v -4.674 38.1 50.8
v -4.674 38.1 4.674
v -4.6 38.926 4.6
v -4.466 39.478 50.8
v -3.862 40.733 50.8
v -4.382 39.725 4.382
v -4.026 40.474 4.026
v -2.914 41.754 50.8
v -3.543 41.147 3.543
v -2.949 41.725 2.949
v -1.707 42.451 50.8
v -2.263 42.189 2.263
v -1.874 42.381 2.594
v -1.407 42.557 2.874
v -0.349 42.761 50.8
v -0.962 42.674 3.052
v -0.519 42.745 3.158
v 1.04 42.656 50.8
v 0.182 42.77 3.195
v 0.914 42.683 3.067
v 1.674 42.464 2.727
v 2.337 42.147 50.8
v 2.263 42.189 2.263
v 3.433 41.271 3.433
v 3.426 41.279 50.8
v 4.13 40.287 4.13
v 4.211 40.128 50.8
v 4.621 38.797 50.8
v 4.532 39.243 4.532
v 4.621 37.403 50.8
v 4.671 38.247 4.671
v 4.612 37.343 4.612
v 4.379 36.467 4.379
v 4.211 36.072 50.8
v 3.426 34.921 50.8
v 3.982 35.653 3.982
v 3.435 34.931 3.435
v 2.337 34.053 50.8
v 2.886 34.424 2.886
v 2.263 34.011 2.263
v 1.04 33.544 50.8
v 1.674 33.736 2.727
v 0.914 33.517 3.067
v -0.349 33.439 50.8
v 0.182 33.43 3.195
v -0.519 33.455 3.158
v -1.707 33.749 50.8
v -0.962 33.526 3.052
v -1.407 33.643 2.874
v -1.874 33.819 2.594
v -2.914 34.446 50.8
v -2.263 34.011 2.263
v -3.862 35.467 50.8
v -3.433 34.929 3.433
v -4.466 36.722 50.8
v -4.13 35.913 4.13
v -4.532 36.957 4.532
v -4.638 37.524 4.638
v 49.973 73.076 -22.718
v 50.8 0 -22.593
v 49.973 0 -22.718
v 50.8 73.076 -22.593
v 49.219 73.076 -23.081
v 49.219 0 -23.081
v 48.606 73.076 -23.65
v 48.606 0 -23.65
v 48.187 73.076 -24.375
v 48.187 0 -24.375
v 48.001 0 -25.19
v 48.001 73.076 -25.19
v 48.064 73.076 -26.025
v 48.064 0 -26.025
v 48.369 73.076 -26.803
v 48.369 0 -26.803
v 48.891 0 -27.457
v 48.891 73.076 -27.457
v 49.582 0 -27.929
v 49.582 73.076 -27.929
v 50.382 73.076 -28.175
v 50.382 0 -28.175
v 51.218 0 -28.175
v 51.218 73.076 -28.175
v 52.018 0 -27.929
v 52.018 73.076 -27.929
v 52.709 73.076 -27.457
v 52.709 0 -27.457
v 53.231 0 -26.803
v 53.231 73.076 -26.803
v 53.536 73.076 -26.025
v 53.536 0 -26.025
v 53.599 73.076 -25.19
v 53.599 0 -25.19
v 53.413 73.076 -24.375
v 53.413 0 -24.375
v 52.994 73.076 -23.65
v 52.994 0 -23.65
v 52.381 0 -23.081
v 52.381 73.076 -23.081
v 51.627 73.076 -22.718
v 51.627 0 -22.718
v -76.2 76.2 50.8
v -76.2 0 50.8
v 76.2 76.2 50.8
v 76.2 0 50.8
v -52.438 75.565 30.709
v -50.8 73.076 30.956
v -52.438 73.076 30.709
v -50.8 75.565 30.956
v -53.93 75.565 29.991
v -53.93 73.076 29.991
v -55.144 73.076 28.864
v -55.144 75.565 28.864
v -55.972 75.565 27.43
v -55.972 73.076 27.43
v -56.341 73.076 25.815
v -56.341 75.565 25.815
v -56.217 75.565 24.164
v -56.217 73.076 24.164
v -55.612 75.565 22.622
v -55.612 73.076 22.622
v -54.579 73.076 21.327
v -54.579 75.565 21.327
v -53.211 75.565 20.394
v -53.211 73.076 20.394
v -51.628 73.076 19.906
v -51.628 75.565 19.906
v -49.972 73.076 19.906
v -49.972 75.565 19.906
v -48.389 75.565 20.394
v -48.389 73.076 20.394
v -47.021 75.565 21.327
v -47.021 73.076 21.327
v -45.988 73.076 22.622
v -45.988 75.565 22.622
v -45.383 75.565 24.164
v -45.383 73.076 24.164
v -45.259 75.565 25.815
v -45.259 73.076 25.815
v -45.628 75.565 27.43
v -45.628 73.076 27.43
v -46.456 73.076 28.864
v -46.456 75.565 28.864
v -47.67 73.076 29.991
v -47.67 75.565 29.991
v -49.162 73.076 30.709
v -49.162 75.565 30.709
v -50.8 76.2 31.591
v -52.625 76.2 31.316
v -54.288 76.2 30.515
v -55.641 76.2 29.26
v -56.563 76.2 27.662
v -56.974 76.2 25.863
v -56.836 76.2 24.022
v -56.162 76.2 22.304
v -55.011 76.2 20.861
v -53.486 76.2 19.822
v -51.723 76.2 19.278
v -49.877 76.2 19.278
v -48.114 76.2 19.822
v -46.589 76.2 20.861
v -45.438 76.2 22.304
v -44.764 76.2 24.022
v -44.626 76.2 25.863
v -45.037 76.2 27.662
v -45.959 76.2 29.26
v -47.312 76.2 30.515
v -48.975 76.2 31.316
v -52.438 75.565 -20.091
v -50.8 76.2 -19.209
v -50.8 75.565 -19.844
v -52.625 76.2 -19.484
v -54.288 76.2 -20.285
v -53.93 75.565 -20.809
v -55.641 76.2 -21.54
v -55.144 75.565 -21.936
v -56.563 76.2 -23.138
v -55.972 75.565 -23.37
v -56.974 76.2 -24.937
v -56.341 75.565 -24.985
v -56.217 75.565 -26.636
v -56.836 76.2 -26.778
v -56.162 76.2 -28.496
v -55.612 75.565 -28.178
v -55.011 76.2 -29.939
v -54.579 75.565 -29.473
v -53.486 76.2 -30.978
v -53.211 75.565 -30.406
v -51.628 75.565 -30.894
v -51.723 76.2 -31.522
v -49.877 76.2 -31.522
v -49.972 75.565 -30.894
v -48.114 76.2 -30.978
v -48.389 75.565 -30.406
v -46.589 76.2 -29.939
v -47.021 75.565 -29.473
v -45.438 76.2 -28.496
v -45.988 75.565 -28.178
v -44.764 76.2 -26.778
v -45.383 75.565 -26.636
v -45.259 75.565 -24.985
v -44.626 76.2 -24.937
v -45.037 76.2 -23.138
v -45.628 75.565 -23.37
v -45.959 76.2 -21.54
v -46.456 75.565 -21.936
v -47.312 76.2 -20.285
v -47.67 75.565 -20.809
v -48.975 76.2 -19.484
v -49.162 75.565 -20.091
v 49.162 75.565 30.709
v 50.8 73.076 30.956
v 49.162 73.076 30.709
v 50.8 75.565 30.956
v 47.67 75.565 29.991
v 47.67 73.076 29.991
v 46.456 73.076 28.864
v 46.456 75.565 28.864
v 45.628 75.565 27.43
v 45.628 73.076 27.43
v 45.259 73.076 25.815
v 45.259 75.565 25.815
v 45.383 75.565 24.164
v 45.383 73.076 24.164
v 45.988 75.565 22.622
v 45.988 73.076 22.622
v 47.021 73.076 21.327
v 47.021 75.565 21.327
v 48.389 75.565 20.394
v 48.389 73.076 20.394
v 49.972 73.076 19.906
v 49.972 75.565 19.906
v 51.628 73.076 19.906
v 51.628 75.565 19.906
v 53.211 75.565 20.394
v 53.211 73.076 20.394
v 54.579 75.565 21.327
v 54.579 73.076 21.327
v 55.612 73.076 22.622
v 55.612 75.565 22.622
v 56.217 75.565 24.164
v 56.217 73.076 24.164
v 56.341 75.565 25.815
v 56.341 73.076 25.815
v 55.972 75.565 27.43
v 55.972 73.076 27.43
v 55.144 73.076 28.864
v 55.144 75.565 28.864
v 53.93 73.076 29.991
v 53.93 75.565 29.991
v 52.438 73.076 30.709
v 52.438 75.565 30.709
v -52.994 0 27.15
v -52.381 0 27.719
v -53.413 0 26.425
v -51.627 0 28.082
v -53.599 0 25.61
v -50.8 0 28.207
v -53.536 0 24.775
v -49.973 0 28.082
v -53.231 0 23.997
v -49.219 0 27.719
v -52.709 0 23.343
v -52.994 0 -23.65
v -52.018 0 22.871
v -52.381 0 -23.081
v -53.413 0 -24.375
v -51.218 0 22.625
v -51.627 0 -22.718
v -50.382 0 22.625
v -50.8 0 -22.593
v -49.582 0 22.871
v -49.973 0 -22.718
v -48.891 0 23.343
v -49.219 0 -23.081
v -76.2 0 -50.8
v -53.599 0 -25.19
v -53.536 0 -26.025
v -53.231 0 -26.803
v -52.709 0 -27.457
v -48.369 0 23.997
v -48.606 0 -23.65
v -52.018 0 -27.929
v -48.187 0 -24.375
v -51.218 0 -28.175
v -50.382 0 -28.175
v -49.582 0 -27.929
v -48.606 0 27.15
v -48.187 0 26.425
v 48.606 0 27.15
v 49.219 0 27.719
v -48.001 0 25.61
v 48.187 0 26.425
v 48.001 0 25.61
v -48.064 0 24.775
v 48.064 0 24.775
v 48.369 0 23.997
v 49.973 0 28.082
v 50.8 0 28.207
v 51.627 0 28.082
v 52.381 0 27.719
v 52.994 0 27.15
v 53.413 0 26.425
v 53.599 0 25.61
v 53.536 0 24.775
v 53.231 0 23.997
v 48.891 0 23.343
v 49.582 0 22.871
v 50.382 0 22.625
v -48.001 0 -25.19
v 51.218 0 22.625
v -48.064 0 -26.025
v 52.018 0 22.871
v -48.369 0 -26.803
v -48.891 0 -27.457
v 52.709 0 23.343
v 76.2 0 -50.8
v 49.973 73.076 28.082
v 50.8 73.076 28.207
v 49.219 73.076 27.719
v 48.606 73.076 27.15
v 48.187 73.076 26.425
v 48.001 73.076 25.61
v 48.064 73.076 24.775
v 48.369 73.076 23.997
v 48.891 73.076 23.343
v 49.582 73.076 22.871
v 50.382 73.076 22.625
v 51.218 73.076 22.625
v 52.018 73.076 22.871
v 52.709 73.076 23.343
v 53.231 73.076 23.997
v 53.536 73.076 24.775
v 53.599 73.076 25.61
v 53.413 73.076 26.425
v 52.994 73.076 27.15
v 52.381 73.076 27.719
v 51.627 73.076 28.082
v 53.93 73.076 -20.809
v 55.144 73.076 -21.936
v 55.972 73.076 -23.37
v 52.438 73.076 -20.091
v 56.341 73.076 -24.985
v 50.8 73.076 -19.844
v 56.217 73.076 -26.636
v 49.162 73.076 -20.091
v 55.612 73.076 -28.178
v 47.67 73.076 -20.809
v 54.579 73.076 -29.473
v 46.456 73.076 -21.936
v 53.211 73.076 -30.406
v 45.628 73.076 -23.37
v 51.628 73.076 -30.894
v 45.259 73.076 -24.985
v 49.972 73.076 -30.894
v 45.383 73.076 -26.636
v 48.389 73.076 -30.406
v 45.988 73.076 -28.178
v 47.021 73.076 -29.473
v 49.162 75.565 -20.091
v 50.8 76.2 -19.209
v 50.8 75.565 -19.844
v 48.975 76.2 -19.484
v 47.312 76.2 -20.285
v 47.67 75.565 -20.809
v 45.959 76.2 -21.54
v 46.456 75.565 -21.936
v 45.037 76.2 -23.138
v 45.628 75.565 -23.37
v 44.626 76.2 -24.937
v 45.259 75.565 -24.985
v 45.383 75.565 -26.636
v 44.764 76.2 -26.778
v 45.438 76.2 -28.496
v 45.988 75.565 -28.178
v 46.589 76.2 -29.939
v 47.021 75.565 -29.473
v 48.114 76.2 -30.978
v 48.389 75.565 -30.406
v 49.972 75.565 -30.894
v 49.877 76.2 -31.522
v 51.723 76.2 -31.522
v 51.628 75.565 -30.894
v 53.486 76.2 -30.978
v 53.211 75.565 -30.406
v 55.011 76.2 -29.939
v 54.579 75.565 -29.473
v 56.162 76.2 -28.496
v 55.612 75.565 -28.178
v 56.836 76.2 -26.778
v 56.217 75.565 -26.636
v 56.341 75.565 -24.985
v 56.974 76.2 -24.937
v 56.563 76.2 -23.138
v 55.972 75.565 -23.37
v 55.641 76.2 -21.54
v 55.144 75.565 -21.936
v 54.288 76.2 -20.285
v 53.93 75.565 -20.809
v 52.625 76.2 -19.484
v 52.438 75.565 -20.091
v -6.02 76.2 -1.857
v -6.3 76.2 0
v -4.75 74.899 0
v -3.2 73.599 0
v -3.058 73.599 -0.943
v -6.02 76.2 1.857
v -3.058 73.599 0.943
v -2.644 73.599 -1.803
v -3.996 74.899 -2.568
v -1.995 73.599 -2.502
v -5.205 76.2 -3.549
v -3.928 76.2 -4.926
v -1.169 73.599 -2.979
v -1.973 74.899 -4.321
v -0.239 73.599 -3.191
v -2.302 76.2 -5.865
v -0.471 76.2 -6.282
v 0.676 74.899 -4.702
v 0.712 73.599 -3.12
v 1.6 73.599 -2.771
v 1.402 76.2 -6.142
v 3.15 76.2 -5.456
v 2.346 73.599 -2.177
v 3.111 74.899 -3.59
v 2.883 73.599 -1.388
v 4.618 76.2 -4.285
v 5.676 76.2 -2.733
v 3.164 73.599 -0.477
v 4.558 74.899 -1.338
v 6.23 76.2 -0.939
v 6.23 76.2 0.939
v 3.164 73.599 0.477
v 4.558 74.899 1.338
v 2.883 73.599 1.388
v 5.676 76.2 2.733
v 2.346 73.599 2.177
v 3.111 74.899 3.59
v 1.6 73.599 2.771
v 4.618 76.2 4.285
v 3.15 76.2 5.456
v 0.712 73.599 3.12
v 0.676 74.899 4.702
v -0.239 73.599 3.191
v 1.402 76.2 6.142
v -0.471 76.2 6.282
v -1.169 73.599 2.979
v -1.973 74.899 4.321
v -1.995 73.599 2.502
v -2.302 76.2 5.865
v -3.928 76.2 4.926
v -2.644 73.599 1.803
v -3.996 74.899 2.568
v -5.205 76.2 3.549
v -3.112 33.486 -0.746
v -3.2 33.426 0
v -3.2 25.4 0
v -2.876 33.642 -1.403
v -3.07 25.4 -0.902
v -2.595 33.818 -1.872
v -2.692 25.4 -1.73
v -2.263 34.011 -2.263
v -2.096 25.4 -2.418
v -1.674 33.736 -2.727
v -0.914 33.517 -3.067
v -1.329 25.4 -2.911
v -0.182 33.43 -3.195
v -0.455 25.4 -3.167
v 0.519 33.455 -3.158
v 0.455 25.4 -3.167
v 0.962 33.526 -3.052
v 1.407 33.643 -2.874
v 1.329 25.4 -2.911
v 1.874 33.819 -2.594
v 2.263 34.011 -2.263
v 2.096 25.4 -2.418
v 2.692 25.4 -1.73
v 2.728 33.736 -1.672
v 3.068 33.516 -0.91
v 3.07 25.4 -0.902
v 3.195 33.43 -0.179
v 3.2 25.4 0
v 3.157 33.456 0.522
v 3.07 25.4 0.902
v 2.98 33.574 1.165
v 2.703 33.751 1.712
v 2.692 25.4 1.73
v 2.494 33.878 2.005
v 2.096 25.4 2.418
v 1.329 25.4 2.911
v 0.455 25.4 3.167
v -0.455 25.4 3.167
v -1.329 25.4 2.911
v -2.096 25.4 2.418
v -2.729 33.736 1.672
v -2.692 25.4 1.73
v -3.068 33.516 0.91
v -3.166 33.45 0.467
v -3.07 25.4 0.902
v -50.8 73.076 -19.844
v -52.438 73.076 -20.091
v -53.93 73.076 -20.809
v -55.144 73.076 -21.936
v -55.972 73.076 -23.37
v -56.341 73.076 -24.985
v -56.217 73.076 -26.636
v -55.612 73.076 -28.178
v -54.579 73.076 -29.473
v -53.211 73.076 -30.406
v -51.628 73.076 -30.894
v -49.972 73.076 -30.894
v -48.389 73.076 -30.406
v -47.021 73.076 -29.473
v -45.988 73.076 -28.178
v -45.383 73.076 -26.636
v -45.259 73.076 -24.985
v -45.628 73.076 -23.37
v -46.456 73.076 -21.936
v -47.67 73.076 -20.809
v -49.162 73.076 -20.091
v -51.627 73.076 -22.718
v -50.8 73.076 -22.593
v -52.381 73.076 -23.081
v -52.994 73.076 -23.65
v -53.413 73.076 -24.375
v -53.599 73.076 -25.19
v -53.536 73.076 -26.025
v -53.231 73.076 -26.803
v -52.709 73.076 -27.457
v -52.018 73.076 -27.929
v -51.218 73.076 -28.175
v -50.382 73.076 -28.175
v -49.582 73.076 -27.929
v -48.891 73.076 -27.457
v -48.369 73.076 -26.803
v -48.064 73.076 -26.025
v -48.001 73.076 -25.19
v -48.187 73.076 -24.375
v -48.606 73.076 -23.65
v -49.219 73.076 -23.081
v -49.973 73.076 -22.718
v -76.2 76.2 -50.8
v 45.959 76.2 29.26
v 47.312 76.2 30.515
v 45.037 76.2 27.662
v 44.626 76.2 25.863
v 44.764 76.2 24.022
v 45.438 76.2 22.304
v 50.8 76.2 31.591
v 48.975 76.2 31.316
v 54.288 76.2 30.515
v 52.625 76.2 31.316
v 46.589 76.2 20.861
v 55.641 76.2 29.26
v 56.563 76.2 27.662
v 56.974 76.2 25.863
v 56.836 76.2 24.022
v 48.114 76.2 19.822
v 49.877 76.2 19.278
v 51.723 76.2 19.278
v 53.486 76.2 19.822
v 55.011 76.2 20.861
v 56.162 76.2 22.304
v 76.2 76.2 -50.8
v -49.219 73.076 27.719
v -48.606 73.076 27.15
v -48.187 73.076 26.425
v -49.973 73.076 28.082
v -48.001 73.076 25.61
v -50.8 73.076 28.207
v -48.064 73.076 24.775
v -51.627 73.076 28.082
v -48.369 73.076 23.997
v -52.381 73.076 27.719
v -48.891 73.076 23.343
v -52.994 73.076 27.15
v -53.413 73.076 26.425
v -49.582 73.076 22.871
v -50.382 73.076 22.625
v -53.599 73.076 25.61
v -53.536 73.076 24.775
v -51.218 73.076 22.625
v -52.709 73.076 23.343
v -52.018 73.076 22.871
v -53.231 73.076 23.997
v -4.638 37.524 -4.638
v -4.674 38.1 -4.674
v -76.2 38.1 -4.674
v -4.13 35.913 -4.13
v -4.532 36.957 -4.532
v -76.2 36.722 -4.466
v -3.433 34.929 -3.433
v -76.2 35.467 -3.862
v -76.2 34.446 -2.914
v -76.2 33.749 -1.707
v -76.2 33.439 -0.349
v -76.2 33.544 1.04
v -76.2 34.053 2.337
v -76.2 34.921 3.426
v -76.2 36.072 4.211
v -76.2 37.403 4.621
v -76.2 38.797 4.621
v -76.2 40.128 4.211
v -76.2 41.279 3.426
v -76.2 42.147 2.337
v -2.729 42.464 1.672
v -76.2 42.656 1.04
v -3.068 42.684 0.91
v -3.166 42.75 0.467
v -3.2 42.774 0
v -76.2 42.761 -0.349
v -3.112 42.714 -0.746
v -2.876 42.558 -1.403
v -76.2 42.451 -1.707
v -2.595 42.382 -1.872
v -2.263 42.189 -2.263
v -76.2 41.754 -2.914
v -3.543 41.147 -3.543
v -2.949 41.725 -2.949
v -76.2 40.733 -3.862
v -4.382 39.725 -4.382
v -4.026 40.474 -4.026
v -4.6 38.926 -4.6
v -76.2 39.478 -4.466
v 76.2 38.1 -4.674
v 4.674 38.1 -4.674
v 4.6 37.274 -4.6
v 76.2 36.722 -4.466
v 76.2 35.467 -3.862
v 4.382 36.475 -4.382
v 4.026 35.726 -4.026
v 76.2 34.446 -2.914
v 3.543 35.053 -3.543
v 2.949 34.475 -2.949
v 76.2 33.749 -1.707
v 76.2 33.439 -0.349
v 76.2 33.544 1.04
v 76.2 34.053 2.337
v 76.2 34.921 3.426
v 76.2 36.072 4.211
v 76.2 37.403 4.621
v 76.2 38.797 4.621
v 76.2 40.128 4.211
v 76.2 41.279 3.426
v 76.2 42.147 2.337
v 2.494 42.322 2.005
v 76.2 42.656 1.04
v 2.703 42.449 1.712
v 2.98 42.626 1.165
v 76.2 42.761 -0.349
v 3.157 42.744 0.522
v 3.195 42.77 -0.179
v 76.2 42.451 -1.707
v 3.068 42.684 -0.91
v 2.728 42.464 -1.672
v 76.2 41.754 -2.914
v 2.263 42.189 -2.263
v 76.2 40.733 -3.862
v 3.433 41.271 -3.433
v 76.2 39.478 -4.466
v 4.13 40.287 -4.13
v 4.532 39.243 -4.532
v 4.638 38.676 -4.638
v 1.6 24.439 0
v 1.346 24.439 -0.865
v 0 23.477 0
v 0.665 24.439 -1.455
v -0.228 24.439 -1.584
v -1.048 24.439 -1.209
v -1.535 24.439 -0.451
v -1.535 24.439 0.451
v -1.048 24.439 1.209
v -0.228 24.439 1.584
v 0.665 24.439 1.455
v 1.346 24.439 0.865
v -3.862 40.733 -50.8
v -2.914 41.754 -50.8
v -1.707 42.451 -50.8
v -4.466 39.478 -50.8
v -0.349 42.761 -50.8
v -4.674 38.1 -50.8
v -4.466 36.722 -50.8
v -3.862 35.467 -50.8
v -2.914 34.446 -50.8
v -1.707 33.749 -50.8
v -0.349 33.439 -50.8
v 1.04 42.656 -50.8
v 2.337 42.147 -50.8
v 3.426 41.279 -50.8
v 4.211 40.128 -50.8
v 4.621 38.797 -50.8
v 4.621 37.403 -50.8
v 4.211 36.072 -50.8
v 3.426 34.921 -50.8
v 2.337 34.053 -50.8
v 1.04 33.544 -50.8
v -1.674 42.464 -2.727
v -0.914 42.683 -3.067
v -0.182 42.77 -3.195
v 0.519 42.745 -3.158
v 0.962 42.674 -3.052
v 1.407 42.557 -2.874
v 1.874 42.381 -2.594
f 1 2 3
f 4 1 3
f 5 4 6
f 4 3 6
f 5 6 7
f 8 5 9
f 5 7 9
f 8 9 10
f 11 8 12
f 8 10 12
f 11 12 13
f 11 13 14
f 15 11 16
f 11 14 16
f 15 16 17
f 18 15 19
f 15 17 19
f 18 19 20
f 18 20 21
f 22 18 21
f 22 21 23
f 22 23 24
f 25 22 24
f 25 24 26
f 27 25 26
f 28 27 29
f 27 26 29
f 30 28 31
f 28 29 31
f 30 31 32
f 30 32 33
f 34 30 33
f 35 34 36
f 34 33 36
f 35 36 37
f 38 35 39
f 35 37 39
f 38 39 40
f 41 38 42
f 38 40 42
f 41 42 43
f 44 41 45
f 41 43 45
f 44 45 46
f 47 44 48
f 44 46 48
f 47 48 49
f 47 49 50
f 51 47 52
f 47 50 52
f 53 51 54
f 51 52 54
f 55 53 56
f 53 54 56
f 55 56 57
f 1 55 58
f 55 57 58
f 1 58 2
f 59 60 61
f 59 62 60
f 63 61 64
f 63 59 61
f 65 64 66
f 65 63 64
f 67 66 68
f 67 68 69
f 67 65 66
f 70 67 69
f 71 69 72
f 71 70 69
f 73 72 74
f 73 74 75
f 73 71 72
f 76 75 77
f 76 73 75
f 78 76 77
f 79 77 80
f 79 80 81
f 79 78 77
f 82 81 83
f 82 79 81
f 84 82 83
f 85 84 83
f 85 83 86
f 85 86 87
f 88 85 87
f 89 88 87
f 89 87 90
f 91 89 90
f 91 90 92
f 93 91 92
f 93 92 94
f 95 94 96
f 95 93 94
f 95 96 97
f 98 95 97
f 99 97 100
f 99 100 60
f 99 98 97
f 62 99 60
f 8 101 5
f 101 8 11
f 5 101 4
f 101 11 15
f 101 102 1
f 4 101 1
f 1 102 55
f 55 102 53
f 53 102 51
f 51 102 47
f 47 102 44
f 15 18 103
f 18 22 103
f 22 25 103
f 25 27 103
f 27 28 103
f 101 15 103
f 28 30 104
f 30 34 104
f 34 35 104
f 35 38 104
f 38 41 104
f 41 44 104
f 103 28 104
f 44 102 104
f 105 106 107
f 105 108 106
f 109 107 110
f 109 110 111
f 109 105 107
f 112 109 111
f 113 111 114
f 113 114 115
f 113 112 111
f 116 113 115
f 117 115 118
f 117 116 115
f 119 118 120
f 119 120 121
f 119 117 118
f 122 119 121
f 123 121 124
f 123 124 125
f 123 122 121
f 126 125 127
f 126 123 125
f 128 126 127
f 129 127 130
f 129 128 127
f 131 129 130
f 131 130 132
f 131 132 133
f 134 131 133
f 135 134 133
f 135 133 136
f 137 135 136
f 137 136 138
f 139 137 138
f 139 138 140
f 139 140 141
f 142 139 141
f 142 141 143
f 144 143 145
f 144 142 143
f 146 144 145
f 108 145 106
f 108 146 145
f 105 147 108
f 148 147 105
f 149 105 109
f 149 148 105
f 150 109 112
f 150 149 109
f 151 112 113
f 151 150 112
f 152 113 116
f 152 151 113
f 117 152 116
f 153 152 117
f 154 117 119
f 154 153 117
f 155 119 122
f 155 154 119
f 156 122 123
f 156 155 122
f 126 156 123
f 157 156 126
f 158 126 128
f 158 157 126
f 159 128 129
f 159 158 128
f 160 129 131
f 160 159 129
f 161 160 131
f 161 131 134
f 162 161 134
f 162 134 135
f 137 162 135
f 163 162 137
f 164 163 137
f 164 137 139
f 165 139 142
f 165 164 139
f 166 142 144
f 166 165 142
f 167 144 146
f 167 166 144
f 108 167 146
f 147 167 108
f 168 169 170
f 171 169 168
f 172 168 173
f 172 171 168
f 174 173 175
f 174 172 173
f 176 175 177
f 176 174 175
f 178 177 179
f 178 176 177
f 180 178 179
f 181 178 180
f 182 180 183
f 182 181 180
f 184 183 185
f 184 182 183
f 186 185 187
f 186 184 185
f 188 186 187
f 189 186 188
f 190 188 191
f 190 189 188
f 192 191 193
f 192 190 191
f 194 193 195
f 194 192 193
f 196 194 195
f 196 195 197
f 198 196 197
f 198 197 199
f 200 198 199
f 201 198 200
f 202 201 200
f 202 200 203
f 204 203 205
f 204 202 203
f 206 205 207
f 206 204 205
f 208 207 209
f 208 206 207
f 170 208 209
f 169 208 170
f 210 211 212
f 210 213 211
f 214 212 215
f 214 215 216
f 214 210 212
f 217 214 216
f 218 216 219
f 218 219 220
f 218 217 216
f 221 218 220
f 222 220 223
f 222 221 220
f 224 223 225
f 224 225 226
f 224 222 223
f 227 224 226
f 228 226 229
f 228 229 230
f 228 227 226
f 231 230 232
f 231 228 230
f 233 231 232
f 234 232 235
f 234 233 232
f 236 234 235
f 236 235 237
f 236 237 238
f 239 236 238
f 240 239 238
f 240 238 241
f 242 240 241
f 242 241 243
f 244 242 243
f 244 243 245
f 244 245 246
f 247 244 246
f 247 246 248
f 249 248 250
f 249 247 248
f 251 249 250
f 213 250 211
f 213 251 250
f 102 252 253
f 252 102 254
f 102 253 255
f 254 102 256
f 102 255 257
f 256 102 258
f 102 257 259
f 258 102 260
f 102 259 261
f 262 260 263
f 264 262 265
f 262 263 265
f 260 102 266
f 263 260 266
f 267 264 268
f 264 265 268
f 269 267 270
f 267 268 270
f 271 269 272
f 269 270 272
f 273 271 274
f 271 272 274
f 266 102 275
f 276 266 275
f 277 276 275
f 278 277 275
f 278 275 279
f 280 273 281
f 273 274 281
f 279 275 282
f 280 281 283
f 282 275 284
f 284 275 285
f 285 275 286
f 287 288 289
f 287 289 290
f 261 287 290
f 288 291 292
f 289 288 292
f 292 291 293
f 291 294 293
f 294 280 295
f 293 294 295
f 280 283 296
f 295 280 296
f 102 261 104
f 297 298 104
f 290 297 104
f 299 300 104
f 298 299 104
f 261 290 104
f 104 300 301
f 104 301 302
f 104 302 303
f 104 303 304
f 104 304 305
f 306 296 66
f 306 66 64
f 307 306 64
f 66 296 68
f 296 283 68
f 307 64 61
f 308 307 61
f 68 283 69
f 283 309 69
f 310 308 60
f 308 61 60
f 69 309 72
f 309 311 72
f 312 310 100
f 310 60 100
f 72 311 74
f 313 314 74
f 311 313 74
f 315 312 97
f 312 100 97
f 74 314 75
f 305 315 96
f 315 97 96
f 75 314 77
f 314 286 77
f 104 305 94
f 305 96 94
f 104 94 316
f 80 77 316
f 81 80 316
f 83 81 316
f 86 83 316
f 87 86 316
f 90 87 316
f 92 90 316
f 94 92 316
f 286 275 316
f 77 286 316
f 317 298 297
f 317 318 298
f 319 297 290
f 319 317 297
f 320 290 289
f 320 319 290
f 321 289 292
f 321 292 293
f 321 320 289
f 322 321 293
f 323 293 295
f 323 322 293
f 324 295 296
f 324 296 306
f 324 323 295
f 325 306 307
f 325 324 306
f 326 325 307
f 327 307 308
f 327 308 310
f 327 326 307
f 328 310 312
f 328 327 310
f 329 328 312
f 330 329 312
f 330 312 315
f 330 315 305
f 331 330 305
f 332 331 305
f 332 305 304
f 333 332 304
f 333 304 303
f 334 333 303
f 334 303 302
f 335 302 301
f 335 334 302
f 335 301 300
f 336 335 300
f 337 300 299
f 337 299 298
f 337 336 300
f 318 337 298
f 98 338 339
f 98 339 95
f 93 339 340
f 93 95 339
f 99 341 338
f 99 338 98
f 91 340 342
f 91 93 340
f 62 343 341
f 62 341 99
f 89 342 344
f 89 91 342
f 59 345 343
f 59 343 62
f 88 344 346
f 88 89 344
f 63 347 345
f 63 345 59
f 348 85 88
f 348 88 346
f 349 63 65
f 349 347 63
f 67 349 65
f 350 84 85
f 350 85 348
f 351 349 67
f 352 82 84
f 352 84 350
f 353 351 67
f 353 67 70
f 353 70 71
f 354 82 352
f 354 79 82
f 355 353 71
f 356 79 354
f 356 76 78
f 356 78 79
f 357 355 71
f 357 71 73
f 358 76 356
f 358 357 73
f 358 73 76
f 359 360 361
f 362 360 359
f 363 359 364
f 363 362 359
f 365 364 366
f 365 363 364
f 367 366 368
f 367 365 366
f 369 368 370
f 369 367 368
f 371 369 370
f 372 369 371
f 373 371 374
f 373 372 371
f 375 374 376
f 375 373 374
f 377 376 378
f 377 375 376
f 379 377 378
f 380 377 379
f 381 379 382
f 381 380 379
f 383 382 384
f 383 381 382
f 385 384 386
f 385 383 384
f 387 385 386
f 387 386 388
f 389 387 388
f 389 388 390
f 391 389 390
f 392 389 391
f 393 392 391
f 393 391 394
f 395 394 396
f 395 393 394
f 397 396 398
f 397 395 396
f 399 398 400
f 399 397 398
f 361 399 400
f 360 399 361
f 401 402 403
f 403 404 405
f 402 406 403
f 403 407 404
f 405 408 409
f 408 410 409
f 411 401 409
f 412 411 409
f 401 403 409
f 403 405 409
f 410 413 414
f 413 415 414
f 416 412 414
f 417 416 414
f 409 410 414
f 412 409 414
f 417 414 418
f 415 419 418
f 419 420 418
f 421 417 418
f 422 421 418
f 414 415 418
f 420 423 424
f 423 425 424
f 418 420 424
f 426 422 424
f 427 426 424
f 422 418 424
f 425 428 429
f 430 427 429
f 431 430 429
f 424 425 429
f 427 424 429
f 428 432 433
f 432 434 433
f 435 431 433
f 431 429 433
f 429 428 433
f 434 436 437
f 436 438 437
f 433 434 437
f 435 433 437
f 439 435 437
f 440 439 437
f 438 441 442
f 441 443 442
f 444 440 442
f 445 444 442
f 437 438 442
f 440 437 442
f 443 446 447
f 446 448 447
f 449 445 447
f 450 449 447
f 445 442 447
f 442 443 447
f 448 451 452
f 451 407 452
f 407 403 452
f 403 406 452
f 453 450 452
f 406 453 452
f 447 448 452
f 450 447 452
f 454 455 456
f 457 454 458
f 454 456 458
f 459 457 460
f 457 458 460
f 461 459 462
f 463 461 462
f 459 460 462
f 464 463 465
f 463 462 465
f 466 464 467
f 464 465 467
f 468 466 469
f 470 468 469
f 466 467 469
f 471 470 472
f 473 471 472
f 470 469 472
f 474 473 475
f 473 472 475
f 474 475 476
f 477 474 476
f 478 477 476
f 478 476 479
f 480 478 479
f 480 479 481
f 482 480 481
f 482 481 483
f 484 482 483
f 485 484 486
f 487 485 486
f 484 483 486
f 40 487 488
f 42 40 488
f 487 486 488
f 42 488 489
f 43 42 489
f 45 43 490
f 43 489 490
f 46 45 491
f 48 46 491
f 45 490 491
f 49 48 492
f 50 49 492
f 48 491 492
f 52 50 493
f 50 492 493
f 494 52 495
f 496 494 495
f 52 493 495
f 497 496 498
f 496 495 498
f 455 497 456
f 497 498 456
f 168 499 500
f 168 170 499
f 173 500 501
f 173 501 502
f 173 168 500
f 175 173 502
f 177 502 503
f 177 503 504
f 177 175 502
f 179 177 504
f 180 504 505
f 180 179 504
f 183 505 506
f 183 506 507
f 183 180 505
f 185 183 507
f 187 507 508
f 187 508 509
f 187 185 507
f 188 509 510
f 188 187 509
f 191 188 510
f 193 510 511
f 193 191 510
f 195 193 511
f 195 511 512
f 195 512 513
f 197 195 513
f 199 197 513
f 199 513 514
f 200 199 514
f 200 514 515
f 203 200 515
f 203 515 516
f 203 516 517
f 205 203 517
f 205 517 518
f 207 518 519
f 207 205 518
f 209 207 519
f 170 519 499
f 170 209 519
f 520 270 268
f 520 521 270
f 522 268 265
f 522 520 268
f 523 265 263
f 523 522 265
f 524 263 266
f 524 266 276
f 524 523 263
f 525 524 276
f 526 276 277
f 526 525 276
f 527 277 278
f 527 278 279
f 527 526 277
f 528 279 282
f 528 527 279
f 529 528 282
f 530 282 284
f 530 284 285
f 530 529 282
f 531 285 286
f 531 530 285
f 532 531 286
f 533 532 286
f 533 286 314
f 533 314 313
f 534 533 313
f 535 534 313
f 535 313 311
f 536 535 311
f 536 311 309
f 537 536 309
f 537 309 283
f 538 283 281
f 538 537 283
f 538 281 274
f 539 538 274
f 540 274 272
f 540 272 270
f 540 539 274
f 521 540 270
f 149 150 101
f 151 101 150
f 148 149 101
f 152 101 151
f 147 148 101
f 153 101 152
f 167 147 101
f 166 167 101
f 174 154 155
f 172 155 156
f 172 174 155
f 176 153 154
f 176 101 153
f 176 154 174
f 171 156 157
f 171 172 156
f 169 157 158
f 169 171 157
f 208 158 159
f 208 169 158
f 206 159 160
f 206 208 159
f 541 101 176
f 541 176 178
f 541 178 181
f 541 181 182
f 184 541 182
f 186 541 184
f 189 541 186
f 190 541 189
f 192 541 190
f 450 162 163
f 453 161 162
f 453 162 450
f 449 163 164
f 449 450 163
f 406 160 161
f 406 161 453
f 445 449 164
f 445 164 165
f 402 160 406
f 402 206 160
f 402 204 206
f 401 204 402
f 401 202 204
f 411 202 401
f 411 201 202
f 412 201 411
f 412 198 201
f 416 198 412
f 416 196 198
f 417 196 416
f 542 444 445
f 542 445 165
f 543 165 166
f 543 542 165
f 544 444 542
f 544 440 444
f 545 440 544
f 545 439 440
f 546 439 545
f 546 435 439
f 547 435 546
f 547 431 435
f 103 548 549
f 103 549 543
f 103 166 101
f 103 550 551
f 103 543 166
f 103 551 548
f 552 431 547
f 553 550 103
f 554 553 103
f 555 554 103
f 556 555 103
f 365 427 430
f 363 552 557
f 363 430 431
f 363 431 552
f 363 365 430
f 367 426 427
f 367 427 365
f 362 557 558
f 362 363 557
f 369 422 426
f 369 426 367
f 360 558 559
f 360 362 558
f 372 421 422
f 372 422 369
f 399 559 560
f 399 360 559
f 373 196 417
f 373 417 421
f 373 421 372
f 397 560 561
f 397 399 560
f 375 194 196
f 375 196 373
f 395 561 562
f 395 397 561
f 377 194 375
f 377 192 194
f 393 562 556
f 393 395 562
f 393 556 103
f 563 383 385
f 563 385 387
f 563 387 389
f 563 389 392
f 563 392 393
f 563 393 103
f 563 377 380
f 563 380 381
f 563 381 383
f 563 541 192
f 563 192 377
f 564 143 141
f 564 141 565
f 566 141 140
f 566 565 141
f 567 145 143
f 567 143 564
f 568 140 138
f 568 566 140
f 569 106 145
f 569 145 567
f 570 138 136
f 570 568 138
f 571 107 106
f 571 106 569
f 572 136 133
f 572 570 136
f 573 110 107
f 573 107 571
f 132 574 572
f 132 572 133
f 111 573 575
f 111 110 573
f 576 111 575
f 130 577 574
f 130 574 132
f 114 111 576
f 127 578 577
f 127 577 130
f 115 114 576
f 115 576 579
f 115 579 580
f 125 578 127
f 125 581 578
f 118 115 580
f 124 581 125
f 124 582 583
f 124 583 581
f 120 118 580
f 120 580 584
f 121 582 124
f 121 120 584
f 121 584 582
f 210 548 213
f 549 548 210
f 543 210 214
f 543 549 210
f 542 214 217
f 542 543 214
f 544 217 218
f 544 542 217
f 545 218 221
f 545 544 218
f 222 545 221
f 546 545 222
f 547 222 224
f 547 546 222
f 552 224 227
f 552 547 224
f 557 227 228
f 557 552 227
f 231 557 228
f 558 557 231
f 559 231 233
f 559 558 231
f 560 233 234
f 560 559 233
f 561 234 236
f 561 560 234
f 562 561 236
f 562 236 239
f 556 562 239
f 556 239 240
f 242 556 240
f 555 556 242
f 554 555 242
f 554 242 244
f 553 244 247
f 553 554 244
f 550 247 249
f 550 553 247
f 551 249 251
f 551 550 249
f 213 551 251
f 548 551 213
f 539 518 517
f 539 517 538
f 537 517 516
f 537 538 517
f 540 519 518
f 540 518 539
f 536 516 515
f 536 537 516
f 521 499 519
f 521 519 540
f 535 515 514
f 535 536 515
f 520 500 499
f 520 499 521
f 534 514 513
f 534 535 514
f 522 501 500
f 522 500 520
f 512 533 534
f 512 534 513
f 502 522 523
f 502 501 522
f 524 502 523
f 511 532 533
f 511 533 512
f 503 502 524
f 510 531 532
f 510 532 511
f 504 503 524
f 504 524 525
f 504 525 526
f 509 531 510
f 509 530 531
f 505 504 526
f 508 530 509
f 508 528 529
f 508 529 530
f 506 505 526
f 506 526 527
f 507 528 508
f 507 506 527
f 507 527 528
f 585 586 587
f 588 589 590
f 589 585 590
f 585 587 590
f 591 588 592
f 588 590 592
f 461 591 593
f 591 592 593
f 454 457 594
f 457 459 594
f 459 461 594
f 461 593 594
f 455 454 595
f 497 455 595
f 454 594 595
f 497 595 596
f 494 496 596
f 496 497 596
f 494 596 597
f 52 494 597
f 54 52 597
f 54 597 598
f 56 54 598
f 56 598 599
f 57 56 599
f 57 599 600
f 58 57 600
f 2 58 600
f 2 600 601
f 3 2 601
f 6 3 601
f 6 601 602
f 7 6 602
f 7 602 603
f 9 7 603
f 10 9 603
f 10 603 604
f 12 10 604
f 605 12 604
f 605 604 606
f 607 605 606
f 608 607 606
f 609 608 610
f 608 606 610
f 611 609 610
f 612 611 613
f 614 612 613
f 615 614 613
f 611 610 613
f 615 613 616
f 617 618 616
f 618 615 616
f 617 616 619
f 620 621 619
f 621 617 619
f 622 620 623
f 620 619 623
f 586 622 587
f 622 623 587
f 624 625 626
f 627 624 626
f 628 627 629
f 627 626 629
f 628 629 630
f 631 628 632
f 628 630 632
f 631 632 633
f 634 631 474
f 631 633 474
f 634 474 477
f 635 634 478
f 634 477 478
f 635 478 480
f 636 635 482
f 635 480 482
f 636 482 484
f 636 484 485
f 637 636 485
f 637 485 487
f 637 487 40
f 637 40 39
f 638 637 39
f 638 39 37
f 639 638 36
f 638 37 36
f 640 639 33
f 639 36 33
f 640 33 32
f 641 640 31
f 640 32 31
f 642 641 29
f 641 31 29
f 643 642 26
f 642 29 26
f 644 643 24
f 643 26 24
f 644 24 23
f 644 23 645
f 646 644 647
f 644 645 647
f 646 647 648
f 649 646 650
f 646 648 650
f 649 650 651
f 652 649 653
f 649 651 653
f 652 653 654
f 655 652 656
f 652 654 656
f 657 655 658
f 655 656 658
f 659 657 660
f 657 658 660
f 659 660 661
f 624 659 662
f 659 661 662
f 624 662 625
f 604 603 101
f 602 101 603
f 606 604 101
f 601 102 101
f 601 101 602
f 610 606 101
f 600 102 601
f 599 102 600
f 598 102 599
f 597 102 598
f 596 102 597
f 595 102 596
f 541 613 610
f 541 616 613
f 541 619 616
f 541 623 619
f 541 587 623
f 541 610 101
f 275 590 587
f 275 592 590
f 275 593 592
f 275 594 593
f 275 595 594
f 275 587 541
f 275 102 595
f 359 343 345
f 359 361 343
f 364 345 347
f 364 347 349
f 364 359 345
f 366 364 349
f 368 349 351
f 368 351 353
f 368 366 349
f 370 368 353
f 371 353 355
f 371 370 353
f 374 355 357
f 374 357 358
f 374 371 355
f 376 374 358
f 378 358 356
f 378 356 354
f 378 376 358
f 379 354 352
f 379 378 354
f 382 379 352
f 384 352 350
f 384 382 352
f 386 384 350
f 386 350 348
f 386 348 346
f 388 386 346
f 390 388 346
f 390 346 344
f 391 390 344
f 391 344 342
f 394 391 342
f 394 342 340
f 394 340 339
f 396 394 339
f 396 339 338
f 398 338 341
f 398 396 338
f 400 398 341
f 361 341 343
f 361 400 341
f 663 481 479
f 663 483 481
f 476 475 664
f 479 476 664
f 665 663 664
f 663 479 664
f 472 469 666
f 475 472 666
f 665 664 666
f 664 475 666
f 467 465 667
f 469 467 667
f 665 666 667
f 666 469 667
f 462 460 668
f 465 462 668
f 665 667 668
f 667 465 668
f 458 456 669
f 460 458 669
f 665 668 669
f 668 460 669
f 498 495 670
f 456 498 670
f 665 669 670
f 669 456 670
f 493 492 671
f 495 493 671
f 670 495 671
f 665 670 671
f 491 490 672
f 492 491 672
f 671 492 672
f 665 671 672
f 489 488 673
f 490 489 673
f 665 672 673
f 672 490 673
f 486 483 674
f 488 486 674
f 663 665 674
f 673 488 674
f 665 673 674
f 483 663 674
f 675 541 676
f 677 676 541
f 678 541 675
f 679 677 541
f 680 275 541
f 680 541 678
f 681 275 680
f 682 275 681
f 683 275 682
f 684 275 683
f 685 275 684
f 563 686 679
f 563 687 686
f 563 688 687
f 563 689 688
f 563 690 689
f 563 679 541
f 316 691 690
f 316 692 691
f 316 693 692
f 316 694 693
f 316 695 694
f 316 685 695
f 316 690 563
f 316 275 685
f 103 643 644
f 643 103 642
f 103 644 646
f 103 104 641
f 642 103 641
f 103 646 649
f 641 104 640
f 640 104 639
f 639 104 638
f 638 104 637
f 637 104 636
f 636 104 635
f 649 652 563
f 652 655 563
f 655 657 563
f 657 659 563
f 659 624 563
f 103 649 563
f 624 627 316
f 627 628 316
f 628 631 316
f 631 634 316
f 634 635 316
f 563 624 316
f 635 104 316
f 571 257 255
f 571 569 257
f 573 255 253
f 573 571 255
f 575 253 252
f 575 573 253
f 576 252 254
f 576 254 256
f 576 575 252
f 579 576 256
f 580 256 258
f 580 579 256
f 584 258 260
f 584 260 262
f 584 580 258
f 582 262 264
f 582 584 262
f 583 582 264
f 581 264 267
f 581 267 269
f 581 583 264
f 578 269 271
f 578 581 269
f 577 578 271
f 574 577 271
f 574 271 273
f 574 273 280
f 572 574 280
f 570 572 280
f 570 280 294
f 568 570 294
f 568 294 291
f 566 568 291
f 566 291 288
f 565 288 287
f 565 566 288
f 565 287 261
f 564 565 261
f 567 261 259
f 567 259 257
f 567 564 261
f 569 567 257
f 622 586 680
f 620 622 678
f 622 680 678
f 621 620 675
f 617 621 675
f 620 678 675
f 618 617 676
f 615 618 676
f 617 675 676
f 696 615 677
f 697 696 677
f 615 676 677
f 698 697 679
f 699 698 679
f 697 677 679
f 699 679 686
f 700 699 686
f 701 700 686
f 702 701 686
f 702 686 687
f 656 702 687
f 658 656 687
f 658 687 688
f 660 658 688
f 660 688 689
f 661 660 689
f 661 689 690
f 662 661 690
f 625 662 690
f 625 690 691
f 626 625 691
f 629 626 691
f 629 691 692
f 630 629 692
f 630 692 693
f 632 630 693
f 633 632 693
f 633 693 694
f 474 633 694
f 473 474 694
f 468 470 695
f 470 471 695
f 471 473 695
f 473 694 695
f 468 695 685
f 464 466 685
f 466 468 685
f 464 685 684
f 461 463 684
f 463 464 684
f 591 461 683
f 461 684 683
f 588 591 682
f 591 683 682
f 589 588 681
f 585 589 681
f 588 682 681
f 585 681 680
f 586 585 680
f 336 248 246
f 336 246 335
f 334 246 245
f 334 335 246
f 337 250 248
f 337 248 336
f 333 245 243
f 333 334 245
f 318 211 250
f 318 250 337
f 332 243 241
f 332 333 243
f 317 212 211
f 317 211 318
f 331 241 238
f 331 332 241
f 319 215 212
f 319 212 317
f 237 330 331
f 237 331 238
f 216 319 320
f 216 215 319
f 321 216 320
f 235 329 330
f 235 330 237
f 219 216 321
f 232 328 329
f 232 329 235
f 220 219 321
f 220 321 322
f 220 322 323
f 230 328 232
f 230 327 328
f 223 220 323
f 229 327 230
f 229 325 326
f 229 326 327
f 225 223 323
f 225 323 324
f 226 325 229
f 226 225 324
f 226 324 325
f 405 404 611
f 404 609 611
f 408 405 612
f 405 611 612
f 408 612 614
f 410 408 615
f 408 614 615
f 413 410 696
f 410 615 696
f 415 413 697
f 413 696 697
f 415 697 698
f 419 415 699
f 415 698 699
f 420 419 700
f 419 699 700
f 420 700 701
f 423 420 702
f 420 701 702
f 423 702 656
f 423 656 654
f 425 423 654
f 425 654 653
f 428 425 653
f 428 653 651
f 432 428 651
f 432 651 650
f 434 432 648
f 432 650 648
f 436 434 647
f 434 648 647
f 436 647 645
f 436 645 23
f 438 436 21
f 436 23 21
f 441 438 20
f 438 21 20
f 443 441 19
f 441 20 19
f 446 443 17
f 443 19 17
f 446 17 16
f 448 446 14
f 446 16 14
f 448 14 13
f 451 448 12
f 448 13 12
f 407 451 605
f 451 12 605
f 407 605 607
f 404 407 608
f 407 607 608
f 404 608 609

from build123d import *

# Parameters (mm, degrees)
SKETCH1_W                                       = 152.4
SKETCH1_H                                       = 101.6
BOSS_EXTRUDE1_DEPTH                             = 76.2
CBORE_FOR_10_BINDING_HEAD_MACHINE_S_2_COUNT     = 2
CBORE_FOR_10_BINDING_HEAD_MACHINE_S_2_PITCH     = 101.6
CBORE_FOR_10_BINDING_HEAD_MACHINE_S_3_COUNT     = 2
CBORE_FOR_10_BINDING_HEAD_MACHINE_S_3_PITCH     = 113.592253257
CBORE_FOR_10_BINDING_HEAD_MACHINE_S_4_COUNT     = 2
CBORE_FOR_10_BINDING_HEAD_MACHINE_S_4_PITCH     = 50.8
CSK_FOR_M6_FLAT_HEAD_MACHINE_SCREW1_D           = 6.4
CSK_FOR_M6_FLAT_HEAD_MACHINE_SCREW1_DEPTH       = 50.8
CSK_FOR_M6_FLAT_HEAD_MACHINE_SCREW1_CSINK_D     = 12.6
CSK_FOR_M6_FLAT_HEAD_MACHINE_SCREW1_CSINK_ANGLE = 100
CSK_FOR_M6_FLAT_HEAD_MACHINE_SCREW1_TIP         = 1.922753981
F_7_16_14_TAPPED_HOLE1_D                        = 9.3472
F_7_16_14_TAPPED_HOLE1_ON_FACE_2_D              = 9.3472


with BuildPart() as part:
    # Sketch1 → Boss-Extrude1 (new body)
    with BuildSketch(Plane(origin=(0, 0, 0), x_dir=(1, 0, 0), z_dir=(0, 1, 0))):
        Rectangle(SKETCH1_W, SKETCH1_H)
    extrude(amount=BOSS_EXTRUDE1_DEPTH)

    # Sketch7 → CBORE for #10 Binding Head Machine Screw2 (revolve, cut)
    with BuildSketch(Plane(origin=(-50.8, 76.2, -25.4), x_dir=(0, 0, 1), z_dir=(1, 0, 0))):
        Polygon((0, 0), (0, 76.2), (2.8067, 76.2), (2.8067, 3.1242), (5.55625, 3.1242), (5.55625, 0.635), (6.19125, 0), align=None)
    cbore_for_10_binding_head_machine_screw = revolve(axis=Axis((-50.8, 82.55, -25.4), (0, -1, 0)), mode=Mode.SUBTRACT)

    # CBORE for _10 Binding Head Machine S 2: CBORE for #10 Binding Head Machine Screw2 ×2
    with Locations(*[(i * CBORE_FOR_10_BINDING_HEAD_MACHINE_S_2_PITCH, 0, 0) for i in range(1, CBORE_FOR_10_BINDING_HEAD_MACHINE_S_2_COUNT)]):
        add(cbore_for_10_binding_head_machine_screw, mode=Mode.SUBTRACT)

    # CBORE for _10 Binding Head Machine S 3: CBORE for #10 Binding Head Machine Screw2 ×2
    with Locations(*[Vector(0.894427191, 0, 0.447213595) * (i * CBORE_FOR_10_BINDING_HEAD_MACHINE_S_3_PITCH) for i in range(1, CBORE_FOR_10_BINDING_HEAD_MACHINE_S_3_COUNT)]):
        add(cbore_for_10_binding_head_machine_screw, mode=Mode.SUBTRACT)

    # CBORE for _10 Binding Head Machine S 4: CBORE for #10 Binding Head Machine Screw2 ×2
    with Locations(*[(0, 0, i * CBORE_FOR_10_BINDING_HEAD_MACHINE_S_4_PITCH) for i in range(1, CBORE_FOR_10_BINDING_HEAD_MACHINE_S_4_COUNT)]):
        add(cbore_for_10_binding_head_machine_screw, mode=Mode.SUBTRACT)

    # CSK for M6 Flat Head Machine Screw1
    with Locations(Plane(origin=(0, 76.2, 0), x_dir=(1, 0, 0), z_dir=(0, 1, 0))):
        with Locations((0, 0)):
            CounterSinkHole(CSK_FOR_M6_FLAT_HEAD_MACHINE_SCREW1_D / 2, CSK_FOR_M6_FLAT_HEAD_MACHINE_SCREW1_CSINK_D / 2, depth=CSK_FOR_M6_FLAT_HEAD_MACHINE_SCREW1_DEPTH, counter_sink_angle=CSK_FOR_M6_FLAT_HEAD_MACHINE_SCREW1_CSINK_ANGLE)
            with Locations((0, 0, -(CSK_FOR_M6_FLAT_HEAD_MACHINE_SCREW1_DEPTH + CSK_FOR_M6_FLAT_HEAD_MACHINE_SCREW1_TIP / 2))):  # 118° drill point
                Cone(0, CSK_FOR_M6_FLAT_HEAD_MACHINE_SCREW1_D / 2, CSK_FOR_M6_FLAT_HEAD_MACHINE_SCREW1_TIP, mode=Mode.SUBTRACT)

    # 7/16-14 Tapped Hole1 (through all)
    with Locations(Plane(origin=(0, 38.1, 50.8), x_dir=(1, 0, 0), z_dir=(0, 0, 1))):
        with Locations((0, 0)):
            Hole(F_7_16_14_TAPPED_HOLE1_D / 2)

    # 7/16-14 Tapped Hole1 on face 2 (through all)
    with Locations(Plane(origin=(76.2, 38.1, 0), x_dir=(0, 0, 1), z_dir=(1, 0, 0))):
        with Locations((0, 0)):
            Hole(F_7_16_14_TAPPED_HOLE1_ON_FACE_2_D / 2)


solid = part.part
